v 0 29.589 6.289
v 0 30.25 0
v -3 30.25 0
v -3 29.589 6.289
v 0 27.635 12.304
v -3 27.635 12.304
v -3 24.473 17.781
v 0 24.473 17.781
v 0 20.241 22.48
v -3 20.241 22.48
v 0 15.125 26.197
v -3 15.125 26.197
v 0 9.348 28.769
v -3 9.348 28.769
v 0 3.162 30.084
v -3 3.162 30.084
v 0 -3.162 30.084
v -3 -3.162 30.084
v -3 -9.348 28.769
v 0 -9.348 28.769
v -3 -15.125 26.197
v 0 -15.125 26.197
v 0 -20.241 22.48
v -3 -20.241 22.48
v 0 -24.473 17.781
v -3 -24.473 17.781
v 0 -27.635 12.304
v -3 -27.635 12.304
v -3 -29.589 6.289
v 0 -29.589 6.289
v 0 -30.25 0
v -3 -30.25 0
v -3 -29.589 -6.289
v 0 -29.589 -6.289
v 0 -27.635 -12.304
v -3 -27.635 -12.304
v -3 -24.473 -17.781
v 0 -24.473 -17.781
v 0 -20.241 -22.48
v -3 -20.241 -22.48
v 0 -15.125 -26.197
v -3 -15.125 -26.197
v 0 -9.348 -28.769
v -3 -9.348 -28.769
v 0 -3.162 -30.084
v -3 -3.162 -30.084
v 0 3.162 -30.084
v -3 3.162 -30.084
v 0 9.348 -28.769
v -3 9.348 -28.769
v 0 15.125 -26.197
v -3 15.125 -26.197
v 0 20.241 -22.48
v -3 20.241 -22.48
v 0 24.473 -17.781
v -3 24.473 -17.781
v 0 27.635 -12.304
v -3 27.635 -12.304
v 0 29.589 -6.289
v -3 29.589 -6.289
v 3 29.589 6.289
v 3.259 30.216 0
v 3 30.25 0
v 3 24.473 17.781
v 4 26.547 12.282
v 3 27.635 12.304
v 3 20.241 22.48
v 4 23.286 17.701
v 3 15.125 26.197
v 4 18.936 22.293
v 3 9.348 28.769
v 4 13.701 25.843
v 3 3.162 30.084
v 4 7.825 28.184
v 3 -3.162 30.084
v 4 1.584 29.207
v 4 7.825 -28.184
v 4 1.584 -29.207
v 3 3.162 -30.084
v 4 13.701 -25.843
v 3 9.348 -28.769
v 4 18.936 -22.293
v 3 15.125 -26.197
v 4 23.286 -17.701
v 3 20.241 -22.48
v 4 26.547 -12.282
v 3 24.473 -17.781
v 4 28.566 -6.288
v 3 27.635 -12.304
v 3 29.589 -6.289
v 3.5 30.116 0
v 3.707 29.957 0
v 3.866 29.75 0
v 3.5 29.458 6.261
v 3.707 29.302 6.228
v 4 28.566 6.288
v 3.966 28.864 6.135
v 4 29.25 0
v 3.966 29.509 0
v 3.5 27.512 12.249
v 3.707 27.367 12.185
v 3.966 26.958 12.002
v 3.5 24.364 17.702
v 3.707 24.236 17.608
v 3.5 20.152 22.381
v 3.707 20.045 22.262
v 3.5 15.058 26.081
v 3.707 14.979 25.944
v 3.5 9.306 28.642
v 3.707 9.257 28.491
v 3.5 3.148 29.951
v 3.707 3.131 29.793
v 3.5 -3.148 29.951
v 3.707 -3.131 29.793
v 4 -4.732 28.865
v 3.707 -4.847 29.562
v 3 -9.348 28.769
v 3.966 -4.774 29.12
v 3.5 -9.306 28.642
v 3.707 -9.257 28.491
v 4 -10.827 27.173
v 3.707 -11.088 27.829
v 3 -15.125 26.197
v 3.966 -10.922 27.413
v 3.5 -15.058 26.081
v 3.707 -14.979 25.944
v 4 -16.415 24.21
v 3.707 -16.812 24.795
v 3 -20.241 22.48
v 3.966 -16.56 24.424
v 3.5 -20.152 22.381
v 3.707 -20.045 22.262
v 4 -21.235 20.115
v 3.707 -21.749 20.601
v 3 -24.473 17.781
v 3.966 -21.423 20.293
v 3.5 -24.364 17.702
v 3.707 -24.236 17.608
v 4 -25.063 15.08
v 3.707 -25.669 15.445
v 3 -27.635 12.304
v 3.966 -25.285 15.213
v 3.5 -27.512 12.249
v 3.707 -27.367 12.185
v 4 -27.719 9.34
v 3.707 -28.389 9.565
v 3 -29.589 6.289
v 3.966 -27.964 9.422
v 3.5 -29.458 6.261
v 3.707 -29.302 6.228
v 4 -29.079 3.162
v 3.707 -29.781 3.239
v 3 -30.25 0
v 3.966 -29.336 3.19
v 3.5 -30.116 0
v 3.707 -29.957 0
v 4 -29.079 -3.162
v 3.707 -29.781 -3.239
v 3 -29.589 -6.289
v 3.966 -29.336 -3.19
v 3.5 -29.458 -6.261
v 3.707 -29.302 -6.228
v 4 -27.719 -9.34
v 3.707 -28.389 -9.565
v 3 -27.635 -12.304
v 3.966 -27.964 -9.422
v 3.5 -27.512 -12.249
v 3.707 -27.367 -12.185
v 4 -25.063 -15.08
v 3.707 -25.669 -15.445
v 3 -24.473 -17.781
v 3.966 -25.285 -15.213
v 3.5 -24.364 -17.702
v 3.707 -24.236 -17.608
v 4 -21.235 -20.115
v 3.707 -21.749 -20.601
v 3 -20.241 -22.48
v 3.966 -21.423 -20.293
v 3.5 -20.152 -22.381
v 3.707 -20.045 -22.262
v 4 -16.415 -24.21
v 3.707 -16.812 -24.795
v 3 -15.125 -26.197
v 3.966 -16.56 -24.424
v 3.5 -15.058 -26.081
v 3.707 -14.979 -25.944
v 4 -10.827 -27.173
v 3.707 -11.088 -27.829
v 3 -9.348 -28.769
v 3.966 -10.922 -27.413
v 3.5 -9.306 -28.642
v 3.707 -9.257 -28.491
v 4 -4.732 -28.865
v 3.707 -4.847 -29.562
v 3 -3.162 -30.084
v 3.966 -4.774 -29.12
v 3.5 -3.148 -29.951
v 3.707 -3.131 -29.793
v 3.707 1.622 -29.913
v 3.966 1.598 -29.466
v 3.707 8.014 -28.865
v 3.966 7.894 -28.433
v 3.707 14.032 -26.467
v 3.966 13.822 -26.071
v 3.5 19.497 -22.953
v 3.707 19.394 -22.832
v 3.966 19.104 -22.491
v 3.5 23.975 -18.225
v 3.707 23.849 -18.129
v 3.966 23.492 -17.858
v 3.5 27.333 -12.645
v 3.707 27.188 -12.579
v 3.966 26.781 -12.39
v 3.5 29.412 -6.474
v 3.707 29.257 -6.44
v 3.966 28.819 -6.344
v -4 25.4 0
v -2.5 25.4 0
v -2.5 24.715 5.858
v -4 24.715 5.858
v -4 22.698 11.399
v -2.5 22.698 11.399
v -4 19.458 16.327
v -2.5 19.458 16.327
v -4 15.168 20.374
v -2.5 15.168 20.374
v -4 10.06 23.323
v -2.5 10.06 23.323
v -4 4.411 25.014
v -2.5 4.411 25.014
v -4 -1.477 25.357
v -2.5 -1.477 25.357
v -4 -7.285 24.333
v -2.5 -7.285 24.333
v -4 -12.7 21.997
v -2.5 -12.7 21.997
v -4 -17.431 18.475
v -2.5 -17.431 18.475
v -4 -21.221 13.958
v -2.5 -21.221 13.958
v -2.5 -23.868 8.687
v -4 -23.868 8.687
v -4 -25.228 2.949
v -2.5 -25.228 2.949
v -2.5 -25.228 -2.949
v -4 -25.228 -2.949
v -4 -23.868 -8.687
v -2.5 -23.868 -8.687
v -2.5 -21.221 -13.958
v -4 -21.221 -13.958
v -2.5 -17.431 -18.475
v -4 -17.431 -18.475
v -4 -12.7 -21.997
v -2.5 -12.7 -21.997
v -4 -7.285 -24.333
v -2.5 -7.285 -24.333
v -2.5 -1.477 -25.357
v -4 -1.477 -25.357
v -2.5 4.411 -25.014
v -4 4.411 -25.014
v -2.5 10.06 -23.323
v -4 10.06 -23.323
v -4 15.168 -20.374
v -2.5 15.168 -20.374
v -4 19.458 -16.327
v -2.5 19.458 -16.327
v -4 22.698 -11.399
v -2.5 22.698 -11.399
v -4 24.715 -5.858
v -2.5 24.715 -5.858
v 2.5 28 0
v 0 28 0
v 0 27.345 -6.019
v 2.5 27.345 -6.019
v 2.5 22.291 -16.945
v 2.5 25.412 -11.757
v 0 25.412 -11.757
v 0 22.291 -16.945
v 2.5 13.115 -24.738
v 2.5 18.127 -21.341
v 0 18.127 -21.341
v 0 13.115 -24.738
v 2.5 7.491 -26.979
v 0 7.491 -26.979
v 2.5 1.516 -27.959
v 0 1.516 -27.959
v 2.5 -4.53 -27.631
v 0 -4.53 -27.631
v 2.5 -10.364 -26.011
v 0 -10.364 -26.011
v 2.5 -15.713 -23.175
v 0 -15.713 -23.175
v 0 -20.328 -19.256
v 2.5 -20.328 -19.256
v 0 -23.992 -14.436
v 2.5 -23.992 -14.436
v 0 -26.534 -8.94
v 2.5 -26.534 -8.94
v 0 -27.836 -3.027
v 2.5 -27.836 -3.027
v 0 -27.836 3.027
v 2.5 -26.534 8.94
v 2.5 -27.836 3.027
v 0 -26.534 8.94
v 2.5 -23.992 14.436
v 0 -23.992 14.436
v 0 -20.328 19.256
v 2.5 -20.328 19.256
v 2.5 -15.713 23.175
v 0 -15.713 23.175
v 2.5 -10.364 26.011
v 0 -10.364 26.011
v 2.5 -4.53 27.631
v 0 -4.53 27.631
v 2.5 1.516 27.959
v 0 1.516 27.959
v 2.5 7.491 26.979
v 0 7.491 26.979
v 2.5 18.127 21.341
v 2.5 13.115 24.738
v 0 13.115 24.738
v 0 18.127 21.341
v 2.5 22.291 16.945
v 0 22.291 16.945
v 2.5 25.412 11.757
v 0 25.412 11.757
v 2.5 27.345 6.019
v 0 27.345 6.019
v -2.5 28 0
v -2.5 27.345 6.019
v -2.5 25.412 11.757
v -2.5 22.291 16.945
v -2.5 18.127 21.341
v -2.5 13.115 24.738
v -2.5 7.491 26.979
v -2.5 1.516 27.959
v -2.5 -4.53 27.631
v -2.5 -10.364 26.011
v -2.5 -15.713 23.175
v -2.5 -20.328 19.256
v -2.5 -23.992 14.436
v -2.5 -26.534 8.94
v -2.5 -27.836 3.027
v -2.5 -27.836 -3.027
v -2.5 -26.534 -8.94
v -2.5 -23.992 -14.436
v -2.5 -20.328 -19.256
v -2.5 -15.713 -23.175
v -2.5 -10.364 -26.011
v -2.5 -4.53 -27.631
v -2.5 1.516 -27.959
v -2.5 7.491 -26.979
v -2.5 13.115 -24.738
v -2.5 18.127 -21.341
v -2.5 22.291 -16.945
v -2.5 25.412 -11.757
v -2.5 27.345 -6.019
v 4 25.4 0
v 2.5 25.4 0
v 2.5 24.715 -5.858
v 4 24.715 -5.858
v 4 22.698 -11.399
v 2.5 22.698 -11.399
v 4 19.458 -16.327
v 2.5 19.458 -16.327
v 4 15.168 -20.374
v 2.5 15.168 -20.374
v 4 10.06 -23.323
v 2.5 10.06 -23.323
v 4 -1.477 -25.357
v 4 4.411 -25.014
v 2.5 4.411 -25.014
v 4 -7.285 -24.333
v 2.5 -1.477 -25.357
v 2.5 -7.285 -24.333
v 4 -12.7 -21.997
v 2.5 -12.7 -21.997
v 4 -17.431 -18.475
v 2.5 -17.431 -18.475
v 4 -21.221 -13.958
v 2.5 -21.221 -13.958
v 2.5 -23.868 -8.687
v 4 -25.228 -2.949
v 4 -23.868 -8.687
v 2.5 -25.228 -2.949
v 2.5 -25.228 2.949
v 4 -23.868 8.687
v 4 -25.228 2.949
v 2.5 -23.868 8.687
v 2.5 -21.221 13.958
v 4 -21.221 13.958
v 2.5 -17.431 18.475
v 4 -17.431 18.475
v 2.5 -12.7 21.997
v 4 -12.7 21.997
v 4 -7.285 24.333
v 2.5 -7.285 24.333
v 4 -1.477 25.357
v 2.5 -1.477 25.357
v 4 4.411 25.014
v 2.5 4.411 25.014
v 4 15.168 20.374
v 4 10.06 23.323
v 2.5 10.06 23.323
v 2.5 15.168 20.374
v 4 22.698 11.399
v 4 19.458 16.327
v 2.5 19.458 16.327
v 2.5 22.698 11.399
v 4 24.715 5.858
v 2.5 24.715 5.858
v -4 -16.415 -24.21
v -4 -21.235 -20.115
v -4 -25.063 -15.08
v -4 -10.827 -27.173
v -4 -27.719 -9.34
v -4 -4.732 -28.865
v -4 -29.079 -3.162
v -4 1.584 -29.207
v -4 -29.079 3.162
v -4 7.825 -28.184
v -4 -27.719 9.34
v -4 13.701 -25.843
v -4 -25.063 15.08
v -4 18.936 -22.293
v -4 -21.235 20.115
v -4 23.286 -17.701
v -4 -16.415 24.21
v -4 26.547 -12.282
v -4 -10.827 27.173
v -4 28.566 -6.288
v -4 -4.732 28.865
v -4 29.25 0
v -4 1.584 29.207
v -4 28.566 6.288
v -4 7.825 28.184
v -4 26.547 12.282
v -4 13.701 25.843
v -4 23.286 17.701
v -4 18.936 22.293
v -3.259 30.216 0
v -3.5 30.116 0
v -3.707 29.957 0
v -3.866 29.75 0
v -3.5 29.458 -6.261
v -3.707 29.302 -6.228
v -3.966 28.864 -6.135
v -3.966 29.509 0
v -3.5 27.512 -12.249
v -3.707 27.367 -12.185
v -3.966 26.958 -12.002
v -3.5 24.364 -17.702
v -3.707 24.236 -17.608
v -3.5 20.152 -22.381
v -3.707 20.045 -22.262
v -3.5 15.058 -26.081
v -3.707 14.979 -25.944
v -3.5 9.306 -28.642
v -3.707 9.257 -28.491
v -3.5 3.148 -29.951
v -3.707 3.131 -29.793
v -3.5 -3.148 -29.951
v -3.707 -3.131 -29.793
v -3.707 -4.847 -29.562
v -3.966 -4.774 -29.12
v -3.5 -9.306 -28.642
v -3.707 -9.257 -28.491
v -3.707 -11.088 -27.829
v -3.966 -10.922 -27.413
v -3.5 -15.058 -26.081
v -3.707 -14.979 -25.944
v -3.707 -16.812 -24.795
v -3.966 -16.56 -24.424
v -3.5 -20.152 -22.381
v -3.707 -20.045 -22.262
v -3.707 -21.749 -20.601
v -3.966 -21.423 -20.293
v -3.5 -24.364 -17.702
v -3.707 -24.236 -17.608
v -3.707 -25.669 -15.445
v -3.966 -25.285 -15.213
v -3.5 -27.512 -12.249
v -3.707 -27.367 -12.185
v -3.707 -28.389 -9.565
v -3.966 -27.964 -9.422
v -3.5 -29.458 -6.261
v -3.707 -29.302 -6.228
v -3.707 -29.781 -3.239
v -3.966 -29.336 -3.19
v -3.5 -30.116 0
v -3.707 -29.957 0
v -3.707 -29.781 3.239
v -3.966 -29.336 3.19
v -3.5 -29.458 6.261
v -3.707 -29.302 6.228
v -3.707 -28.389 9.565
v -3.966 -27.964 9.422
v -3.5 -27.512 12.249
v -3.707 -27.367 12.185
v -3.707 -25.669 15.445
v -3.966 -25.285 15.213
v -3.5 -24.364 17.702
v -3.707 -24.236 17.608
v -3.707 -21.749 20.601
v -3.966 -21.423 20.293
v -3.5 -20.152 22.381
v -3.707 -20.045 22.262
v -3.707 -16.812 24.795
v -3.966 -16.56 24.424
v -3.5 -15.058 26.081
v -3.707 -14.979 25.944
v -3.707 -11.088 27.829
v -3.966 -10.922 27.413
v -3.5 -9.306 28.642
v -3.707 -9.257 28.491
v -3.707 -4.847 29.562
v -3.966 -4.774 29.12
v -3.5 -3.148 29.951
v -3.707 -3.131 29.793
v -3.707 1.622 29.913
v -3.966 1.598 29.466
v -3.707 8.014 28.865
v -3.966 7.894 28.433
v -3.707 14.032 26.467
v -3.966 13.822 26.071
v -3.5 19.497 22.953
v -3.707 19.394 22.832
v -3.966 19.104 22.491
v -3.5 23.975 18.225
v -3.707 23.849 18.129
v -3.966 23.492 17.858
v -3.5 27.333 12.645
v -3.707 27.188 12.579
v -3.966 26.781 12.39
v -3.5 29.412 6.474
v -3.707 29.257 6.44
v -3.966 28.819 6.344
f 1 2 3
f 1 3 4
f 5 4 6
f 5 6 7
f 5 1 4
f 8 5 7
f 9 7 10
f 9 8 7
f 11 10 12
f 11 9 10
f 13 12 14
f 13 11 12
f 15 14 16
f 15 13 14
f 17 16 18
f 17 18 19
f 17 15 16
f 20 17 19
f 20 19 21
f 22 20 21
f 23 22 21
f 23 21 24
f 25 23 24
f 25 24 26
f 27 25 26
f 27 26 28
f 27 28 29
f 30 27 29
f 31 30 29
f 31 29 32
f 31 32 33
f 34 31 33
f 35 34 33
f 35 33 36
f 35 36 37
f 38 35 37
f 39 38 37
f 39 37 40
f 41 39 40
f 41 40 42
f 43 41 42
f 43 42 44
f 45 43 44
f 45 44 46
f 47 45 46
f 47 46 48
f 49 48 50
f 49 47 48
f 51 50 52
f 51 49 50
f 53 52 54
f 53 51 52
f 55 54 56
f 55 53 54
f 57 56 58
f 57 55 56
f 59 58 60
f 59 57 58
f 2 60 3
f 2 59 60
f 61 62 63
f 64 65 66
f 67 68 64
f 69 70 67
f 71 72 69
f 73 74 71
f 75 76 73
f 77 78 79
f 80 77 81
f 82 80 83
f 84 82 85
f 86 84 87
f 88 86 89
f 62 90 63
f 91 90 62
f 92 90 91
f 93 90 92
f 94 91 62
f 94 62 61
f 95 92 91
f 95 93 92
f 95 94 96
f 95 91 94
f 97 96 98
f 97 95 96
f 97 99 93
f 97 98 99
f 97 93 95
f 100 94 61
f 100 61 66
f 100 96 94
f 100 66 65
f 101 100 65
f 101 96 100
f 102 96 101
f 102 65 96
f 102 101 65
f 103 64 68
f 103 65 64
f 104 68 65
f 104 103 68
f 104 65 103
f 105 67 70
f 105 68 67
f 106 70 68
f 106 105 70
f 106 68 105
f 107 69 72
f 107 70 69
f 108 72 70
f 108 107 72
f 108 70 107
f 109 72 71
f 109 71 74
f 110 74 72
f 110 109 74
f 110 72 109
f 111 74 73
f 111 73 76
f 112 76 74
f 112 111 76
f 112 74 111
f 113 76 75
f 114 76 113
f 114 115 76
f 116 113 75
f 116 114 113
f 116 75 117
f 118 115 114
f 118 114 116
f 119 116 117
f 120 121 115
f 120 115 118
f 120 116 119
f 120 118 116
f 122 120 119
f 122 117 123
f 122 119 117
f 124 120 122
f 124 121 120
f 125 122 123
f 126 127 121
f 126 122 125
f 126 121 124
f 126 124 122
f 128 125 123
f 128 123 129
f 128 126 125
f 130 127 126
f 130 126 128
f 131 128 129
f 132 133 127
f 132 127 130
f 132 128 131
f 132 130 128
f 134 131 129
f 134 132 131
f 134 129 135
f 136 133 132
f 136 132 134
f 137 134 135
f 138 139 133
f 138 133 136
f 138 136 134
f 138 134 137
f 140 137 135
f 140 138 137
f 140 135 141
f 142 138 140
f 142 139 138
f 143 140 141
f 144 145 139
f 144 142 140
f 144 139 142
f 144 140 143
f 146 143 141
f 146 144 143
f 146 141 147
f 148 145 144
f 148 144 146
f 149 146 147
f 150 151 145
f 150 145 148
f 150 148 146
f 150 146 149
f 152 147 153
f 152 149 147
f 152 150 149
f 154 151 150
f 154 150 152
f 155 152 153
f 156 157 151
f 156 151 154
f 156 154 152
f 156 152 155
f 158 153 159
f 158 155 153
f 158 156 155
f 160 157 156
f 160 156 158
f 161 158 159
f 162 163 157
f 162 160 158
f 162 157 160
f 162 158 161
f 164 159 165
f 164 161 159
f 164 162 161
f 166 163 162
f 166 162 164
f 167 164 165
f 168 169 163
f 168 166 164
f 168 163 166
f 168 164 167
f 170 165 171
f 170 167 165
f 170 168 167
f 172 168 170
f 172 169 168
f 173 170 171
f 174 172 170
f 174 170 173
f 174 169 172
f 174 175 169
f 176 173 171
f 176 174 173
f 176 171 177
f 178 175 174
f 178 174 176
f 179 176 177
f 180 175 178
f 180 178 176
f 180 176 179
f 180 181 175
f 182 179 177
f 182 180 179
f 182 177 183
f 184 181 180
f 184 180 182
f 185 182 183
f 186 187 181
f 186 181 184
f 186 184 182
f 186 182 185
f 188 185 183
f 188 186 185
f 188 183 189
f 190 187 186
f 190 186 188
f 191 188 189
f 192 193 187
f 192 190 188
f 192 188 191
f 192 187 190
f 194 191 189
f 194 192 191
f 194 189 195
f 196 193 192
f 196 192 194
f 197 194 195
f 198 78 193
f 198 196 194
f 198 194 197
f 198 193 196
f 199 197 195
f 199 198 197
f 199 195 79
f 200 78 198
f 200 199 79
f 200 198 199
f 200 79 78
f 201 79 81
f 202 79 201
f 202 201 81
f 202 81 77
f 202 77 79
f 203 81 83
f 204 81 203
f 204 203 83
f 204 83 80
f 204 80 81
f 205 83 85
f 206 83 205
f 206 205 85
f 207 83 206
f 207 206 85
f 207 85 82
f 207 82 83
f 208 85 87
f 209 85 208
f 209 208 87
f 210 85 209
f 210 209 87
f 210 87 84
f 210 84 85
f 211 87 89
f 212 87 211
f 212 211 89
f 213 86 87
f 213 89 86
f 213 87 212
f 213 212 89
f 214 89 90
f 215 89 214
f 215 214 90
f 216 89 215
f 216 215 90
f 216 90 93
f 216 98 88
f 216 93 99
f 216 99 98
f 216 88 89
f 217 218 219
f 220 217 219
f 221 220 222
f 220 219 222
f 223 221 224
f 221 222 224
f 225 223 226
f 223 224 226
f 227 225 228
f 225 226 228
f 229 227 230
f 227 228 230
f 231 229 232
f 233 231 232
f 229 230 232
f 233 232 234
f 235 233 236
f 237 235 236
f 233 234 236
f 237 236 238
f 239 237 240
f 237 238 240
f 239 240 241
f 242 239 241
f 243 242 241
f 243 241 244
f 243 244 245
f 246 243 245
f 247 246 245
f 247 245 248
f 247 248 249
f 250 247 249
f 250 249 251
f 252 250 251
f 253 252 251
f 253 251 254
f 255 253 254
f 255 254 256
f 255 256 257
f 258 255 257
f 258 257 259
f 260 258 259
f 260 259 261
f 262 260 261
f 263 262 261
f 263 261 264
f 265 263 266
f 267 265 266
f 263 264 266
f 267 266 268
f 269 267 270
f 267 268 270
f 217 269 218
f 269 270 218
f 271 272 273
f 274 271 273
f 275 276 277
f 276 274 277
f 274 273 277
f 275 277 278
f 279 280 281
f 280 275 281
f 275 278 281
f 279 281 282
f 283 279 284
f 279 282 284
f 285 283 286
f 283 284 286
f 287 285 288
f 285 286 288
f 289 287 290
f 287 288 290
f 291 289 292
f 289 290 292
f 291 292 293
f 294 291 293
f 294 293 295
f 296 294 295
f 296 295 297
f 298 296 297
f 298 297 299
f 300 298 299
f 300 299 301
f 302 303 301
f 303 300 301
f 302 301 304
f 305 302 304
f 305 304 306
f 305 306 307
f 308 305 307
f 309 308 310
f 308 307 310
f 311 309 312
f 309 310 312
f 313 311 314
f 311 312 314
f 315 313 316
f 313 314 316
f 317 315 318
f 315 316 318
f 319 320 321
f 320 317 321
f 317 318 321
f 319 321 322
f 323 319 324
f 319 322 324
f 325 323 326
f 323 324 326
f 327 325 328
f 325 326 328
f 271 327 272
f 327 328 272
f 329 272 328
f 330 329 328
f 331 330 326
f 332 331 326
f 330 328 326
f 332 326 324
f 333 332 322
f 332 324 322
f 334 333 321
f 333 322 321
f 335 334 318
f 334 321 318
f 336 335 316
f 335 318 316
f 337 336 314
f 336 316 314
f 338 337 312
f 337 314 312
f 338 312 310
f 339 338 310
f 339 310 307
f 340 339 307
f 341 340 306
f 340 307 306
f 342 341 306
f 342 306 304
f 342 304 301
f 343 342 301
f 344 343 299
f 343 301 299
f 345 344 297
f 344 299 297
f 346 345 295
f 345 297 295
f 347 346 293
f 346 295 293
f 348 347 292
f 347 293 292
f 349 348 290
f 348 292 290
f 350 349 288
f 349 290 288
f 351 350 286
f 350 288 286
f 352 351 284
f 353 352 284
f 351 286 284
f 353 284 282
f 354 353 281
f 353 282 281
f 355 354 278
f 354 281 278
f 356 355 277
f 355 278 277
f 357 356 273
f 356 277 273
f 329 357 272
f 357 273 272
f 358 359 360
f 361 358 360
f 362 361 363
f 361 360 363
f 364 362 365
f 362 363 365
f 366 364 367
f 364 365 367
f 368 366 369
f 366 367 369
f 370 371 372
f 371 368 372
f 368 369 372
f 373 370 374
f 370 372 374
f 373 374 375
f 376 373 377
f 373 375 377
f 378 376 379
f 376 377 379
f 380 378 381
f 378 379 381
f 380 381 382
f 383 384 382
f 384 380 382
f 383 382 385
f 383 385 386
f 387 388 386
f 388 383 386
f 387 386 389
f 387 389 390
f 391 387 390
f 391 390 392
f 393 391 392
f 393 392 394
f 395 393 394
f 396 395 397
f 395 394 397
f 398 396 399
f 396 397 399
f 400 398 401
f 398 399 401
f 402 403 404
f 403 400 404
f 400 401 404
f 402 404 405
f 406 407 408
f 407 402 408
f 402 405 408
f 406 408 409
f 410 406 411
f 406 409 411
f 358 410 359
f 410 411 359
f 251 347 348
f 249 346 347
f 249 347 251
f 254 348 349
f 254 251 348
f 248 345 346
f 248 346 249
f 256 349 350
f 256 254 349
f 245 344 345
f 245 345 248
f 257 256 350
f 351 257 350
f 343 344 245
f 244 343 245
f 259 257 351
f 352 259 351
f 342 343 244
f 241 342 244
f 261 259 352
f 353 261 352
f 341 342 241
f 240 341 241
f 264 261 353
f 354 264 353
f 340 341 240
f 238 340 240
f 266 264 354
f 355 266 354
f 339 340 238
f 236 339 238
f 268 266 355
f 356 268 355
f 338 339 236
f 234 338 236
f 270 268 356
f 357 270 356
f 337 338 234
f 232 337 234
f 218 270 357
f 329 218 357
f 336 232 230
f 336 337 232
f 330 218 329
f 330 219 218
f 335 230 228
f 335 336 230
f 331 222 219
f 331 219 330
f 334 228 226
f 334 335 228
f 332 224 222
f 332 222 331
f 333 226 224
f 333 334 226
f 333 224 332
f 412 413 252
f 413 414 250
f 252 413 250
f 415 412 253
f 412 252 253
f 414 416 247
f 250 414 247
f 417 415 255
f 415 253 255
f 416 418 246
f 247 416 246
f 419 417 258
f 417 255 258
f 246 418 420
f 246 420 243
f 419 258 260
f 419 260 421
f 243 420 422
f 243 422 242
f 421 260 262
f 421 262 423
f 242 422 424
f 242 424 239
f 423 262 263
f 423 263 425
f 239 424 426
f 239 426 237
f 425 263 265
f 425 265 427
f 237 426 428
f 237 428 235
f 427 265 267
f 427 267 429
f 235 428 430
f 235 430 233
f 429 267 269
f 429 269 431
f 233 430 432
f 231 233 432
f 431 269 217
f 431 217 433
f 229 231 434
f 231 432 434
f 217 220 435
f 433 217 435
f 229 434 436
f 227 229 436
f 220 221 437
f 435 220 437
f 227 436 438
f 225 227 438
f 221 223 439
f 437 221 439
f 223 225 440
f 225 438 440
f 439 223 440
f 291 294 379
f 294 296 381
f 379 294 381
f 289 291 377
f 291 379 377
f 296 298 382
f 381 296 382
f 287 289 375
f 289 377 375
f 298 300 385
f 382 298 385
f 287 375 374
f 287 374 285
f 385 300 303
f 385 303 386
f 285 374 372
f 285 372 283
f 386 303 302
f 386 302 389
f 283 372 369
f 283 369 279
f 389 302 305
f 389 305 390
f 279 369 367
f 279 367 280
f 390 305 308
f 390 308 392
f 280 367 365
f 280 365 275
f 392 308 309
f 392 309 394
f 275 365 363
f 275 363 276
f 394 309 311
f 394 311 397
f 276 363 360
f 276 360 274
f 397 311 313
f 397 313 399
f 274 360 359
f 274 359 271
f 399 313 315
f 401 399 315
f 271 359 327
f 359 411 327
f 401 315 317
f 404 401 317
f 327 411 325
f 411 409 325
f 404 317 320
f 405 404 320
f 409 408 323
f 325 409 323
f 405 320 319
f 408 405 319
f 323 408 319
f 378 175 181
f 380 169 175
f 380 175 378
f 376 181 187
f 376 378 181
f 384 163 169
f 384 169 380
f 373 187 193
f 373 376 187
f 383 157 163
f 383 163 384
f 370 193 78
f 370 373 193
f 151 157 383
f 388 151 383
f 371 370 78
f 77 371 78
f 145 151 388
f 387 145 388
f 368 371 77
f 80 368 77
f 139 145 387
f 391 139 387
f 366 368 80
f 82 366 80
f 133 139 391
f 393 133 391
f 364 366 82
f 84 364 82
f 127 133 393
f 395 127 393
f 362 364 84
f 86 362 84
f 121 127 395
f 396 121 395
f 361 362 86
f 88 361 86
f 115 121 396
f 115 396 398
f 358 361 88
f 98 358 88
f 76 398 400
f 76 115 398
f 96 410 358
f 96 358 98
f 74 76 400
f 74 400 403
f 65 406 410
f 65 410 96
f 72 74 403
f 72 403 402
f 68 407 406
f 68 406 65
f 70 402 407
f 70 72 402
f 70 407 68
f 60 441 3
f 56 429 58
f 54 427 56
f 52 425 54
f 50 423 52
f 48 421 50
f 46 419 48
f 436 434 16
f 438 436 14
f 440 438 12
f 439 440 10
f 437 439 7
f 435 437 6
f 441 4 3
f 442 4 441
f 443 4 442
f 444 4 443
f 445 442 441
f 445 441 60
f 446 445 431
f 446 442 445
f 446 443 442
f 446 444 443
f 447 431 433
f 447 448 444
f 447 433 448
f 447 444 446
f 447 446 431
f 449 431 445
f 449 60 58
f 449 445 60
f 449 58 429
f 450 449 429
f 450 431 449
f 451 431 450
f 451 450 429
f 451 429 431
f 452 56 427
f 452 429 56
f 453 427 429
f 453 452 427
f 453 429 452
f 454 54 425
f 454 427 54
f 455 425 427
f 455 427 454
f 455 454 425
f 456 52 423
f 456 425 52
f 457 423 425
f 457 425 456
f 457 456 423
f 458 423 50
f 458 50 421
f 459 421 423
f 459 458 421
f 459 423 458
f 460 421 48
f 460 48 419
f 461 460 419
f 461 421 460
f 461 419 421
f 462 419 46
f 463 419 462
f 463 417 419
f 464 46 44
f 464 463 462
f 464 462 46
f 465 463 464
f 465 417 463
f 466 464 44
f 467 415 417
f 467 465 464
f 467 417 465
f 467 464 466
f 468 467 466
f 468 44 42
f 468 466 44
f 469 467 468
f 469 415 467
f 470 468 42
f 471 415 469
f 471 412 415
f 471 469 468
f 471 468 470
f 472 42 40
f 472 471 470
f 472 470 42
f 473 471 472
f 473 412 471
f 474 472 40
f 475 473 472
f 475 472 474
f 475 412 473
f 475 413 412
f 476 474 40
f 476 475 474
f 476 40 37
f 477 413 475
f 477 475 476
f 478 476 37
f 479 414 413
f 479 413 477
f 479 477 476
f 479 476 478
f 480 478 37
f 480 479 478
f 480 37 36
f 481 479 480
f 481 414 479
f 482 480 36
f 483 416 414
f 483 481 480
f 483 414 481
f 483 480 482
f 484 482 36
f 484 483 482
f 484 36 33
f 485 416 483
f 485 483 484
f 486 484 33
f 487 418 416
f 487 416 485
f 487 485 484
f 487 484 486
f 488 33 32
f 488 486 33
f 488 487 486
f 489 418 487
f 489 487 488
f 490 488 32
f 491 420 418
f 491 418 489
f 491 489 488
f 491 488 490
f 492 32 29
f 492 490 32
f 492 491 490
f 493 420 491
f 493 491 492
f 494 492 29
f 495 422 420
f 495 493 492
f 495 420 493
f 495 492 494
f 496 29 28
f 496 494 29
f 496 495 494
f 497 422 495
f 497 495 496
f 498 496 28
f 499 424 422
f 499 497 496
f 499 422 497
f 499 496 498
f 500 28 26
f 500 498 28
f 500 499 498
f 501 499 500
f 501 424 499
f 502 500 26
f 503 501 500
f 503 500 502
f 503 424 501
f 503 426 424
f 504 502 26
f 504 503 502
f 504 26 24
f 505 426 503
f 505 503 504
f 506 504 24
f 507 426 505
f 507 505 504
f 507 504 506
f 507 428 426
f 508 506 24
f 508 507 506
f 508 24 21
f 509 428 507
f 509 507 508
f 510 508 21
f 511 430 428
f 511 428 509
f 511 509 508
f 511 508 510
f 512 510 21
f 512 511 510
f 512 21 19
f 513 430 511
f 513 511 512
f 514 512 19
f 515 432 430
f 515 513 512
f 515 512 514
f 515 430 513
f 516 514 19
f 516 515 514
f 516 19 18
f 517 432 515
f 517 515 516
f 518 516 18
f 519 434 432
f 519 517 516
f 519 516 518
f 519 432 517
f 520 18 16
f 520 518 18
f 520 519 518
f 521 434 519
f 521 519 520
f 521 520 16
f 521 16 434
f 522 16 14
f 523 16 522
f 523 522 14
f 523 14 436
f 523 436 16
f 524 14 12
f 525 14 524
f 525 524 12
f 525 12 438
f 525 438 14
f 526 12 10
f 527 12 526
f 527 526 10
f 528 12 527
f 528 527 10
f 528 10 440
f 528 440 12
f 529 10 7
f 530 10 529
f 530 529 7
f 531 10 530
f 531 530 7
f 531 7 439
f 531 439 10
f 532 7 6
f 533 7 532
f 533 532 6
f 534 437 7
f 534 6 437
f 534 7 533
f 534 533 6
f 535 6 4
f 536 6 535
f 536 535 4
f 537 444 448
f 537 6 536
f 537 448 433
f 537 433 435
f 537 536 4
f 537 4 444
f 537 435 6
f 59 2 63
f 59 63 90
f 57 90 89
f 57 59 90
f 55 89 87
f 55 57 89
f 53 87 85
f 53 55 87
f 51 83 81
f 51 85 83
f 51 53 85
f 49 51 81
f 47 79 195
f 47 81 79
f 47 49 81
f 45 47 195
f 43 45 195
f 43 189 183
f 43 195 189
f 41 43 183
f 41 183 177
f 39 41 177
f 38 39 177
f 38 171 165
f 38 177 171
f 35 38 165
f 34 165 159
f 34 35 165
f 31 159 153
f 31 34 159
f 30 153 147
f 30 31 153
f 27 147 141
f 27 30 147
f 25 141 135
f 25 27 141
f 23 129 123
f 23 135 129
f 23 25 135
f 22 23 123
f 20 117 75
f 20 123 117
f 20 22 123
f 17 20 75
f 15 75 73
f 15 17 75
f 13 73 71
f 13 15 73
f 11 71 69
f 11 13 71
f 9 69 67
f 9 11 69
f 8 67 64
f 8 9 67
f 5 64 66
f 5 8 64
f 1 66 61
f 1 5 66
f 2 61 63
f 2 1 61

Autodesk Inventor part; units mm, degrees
ref_plane "YZ Plane" through (0, 0, 0) normal (1, 0, 0) x (0, 1, 0)
ref_plane "XZ Plane" through (0, 0, 0) normal (0, 1, 0) x (-1, 0, 0)
ref_plane "XY Plane" through (0, 0, 0) normal (0, 0, 1) x (1, 0, 0)
sketch "Sketch1" plane through (0, 0, 0) normal (1, 0, 0) x (0, 1, 0)
  circle A0 centre (0, 0) radius 30.25
  circle A1 centre (0, 0) radius 25.4
  dimension "d0" = 60.5
  dimension "d3" = 50.8
extrude "Extrusion1" add sketch "Sketch1" along normal mid plane 8
sketch "Sketch2" plane through (0, 0, 0) normal (1, 0, 0) x (0, 1, 0)
  circle A0 centre (0, 0) radius 28
  dimension "d4" = 56
extrude "Extrusion2" cut sketch "Sketch2" along normal mid plane 5
fillet "Fillet1" radius 1 2 edges at (-4, -30.25, 0) (4, -30.25, 0)
properties part number "Rubber Wheel Cap"
